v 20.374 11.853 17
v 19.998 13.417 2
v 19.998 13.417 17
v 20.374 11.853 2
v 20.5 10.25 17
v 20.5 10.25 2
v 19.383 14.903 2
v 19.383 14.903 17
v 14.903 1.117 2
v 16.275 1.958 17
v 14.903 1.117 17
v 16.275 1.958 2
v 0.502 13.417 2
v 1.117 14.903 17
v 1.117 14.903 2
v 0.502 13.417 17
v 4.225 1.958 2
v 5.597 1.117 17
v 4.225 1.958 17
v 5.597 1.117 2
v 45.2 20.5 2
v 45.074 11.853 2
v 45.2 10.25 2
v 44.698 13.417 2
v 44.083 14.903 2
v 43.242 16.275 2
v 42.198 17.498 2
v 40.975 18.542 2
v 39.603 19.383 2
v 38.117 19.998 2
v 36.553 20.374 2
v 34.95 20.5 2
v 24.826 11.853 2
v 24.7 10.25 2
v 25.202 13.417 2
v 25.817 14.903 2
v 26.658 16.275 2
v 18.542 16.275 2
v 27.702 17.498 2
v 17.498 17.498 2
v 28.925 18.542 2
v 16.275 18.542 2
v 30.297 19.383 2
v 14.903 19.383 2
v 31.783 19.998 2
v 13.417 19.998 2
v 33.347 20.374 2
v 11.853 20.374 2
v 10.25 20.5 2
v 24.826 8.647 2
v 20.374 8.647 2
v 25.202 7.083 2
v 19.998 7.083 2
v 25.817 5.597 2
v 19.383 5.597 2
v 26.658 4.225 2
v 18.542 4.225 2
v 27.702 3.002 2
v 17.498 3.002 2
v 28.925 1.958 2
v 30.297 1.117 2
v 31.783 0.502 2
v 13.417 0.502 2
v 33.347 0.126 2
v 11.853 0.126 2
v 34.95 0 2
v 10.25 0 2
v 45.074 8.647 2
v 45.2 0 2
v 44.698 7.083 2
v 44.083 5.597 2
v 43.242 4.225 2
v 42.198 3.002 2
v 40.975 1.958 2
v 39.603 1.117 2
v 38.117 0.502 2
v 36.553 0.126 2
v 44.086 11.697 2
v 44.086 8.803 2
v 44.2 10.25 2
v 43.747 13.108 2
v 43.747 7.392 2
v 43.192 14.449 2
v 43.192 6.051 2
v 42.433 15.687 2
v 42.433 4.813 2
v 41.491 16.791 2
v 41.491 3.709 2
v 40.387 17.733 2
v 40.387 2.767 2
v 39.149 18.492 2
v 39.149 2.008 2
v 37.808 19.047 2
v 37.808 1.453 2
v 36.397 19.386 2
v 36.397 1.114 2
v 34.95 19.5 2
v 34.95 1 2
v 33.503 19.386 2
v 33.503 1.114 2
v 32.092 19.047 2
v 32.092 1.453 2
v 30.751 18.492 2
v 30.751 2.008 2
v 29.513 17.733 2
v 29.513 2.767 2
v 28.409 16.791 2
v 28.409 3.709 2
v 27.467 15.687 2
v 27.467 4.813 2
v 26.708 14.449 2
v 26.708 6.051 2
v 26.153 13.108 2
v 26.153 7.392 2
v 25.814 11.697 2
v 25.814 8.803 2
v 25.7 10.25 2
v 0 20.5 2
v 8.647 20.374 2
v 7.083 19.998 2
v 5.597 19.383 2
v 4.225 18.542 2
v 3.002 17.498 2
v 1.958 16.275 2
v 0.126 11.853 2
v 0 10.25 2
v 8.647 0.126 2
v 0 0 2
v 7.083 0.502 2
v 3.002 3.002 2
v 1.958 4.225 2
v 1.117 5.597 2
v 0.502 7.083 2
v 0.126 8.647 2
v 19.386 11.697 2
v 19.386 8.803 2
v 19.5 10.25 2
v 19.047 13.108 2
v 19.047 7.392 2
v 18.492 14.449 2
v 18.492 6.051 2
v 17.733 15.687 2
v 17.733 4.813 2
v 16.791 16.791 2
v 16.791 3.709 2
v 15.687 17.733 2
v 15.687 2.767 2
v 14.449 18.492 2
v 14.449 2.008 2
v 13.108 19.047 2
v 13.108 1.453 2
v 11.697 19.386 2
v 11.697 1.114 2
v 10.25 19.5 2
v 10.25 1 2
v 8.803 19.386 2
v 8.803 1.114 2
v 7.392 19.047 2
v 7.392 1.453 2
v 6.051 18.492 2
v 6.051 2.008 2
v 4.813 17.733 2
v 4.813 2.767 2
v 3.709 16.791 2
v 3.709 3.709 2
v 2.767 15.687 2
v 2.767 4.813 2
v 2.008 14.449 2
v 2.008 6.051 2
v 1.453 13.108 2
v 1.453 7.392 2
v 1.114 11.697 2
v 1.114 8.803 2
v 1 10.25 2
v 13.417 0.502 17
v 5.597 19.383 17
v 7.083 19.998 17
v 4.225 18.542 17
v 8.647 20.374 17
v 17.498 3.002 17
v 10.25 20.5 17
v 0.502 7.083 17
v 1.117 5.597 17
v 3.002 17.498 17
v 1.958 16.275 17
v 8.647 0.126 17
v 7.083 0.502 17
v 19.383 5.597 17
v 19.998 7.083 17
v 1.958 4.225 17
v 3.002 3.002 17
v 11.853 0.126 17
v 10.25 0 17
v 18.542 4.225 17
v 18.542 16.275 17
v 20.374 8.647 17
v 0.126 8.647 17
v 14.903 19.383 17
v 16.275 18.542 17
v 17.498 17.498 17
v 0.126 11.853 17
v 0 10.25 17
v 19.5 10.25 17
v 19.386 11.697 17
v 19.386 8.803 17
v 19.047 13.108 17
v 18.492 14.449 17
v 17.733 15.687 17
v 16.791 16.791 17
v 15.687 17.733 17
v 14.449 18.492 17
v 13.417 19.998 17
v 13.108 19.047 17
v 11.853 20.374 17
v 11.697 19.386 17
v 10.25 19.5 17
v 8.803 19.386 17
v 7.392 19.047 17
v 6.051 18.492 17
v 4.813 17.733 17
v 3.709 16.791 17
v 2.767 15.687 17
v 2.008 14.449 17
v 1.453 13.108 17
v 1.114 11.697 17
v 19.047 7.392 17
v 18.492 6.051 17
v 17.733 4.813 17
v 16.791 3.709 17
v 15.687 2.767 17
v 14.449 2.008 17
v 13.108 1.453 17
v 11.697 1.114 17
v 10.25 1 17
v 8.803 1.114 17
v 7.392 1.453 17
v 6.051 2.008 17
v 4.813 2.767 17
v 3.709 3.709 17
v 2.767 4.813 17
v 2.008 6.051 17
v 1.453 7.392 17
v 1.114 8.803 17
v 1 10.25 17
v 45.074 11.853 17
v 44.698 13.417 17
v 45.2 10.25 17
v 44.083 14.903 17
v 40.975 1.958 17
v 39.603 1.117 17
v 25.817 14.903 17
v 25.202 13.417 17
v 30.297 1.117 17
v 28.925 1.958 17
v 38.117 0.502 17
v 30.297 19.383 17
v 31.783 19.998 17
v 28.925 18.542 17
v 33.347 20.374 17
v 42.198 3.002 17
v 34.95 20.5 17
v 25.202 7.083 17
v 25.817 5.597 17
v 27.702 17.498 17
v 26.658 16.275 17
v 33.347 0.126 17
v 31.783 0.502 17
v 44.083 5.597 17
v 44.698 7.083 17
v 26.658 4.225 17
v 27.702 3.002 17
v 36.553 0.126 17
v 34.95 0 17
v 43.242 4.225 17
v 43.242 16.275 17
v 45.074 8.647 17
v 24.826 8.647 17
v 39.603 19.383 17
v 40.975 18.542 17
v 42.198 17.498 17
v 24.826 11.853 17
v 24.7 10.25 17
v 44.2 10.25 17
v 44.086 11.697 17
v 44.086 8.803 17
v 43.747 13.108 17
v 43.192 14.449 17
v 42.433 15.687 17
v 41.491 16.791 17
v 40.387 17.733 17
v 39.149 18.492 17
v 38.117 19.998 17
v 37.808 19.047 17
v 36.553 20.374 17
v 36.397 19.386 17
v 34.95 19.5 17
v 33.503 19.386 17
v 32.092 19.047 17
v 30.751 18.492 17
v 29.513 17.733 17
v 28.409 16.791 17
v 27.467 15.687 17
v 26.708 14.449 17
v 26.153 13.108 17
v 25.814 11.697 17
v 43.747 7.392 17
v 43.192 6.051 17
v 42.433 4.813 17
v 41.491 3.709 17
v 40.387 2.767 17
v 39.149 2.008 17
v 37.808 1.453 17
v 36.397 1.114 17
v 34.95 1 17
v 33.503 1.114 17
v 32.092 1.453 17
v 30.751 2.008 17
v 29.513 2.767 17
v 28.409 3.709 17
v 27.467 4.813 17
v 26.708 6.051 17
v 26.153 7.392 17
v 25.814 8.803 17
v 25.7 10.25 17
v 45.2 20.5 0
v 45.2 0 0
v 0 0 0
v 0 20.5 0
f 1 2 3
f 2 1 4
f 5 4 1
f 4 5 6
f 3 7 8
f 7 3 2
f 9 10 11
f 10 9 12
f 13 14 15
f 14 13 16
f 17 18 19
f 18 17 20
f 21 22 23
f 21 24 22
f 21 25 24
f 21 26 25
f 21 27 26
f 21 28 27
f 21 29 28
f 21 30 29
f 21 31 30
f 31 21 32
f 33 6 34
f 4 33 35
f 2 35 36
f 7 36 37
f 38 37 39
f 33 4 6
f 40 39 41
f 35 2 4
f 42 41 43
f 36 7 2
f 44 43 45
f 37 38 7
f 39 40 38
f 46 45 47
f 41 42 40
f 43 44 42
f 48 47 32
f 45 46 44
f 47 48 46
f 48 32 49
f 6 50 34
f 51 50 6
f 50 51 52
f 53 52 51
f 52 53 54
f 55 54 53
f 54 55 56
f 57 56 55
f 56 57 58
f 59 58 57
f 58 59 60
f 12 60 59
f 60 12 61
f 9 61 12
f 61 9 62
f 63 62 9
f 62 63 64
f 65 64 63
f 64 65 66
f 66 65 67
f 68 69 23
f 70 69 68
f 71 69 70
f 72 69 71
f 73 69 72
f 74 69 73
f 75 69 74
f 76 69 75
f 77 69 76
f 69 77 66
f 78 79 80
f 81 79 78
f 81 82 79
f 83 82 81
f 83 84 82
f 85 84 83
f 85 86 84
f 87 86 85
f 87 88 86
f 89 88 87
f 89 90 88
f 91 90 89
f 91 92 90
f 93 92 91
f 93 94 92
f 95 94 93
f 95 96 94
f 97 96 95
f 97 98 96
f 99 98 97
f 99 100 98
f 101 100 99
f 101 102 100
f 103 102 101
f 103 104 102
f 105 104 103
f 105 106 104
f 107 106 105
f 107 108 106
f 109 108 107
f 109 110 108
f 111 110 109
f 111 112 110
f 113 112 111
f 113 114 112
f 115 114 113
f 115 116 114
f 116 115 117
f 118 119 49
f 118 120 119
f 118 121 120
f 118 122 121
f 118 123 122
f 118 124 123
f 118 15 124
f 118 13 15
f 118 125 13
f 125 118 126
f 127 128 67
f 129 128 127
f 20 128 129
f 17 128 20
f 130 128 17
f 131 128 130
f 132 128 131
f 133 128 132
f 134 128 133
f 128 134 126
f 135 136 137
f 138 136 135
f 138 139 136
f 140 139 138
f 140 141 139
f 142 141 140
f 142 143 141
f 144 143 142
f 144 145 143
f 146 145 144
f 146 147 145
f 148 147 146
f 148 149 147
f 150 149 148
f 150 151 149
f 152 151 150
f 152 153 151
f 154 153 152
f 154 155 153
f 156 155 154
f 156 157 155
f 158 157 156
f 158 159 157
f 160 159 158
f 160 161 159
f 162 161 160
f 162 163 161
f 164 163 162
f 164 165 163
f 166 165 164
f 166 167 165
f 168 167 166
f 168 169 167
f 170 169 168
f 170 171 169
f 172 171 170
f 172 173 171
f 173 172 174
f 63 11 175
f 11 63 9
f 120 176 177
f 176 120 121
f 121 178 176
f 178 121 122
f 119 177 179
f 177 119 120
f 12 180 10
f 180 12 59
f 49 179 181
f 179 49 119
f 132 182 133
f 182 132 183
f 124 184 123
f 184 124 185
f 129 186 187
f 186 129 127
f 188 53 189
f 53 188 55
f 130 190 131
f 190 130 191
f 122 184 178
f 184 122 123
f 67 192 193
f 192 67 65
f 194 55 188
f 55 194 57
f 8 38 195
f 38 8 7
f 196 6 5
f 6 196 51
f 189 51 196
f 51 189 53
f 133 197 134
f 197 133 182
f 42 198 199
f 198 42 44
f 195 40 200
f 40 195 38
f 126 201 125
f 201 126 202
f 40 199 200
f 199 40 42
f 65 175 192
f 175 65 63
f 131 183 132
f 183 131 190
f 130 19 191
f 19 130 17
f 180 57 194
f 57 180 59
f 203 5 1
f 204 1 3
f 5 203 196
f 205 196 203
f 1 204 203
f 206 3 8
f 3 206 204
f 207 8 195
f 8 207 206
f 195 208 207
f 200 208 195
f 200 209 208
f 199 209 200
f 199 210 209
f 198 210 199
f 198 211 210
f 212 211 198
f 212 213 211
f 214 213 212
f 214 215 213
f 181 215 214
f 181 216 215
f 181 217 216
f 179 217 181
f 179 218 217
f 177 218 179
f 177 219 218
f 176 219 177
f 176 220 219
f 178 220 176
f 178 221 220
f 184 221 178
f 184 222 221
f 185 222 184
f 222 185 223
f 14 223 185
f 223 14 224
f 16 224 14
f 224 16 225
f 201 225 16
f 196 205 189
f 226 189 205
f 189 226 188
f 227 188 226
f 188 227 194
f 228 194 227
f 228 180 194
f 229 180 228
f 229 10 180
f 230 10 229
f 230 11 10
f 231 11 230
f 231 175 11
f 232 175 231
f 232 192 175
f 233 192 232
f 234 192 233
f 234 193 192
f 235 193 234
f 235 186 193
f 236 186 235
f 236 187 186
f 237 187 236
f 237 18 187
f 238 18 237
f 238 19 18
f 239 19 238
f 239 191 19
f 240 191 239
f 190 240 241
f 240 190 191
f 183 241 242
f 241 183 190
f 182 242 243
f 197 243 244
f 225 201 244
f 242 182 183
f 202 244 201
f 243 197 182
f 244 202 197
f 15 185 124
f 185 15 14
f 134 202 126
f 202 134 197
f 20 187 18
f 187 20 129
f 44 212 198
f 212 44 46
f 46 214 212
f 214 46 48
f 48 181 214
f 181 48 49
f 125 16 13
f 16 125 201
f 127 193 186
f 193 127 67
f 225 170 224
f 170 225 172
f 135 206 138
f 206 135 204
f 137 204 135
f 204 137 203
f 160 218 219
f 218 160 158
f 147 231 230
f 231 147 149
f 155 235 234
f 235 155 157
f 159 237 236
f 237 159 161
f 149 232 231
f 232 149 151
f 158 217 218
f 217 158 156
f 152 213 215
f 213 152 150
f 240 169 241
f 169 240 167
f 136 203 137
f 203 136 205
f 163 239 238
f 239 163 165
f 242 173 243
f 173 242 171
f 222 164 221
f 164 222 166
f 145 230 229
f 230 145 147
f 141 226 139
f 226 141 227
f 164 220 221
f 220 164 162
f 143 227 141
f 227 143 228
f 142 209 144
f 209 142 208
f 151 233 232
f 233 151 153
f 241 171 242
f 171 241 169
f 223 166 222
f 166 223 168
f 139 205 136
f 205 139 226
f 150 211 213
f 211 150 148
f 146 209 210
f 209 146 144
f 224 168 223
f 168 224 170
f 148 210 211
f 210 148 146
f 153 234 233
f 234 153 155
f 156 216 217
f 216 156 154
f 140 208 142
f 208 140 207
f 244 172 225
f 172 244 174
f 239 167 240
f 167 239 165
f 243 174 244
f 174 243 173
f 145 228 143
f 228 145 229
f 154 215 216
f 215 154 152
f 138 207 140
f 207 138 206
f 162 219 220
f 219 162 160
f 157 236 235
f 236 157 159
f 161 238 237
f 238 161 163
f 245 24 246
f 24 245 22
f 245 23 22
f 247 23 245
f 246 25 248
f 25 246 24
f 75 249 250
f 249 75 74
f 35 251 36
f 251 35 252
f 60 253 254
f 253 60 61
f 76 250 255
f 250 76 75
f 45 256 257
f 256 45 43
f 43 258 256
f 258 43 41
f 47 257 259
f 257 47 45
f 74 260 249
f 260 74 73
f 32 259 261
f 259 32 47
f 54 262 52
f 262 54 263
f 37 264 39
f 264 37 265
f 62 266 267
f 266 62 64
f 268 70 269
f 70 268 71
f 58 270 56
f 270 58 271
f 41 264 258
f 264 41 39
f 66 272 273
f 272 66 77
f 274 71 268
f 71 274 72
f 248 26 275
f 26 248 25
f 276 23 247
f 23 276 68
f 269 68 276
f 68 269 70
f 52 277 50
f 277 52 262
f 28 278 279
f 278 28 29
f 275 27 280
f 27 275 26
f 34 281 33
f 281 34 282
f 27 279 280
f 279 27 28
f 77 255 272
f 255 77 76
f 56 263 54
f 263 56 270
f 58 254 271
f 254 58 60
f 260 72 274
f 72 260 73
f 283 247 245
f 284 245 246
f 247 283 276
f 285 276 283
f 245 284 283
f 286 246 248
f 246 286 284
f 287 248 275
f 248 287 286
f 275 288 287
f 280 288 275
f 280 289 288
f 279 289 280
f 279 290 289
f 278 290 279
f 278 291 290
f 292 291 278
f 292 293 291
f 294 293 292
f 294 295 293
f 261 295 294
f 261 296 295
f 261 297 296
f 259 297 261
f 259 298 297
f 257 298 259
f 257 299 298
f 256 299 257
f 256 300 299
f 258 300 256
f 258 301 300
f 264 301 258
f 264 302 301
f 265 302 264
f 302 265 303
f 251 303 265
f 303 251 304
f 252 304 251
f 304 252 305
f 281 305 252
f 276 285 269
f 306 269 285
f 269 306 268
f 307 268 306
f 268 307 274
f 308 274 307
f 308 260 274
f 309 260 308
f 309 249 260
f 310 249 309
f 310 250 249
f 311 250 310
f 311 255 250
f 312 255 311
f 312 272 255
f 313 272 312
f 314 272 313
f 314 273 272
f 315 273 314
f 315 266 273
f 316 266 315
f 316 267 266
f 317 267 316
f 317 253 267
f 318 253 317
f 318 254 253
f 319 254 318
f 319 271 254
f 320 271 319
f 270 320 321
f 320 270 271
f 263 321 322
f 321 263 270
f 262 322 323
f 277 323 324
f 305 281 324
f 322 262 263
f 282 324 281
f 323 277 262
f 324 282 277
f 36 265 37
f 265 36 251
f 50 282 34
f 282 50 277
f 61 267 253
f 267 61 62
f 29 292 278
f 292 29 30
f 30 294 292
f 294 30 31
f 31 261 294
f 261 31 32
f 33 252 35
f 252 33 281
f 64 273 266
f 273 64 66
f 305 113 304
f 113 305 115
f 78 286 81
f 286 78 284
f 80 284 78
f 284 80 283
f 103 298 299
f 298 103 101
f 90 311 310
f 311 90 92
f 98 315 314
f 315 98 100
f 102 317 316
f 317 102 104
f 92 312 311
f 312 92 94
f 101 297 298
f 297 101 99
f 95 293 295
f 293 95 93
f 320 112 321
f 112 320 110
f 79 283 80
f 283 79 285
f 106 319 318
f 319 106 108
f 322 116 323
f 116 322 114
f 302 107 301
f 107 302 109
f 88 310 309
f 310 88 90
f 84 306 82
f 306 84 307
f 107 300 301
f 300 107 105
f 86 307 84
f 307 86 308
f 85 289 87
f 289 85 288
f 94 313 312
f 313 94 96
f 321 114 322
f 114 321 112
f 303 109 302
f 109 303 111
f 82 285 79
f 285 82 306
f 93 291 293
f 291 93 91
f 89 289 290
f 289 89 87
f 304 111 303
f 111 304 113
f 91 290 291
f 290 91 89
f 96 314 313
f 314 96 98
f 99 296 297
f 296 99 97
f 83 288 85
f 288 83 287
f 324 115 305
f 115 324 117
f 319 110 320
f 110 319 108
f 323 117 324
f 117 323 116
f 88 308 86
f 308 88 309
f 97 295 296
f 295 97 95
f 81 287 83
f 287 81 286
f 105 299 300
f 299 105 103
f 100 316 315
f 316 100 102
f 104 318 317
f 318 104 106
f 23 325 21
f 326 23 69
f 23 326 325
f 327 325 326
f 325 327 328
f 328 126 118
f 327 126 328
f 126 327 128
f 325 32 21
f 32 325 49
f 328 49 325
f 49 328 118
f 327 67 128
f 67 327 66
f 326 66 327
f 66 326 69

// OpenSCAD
// file: config.scad
// Author: Mihai Oltean, www.tcreate.org, mihai.oltean@gmail.com
// More details: jenny5.org
// Source: github.com/jenny5-robot
// MIT License
//--------------------------------------------------------------

aluminium_color = "Silver";
screw_color = "LightSlateGray";
frame_color = aluminium_color;
shaft_color = "Silver";
plastic_color = "LimeGreen";
pulley_color = "DarkSlateGray";
steel_color = "LightSlateGray";
// file: utils.scad
// Author: Mihai Oltean, https://mihaioltean.github.io, mihai.oltean@gmail.com
// More details: https://jenny5.org, https://jenny5-robot.github.io/
// Source code: github.com/jenny5-robot
// License: MIT
//--------------------------------------------------------------
module corner(radius, height)
{
	difference(){
		cube ([radius, radius, height]);
		cylinder	(h = height, r = radius, $fn = 30);
	}
}
//---------------------------------------------------------------
module spherical_corner(radius)
{
	difference(){
		cube ([radius, radius, radius]);
		sphere(r = radius, $fn = 40);
	}
}
//---------------------------------------------------------------
module spherical_column(height, radius)
{
		difference(){
			cube ([height, height, height]);
			cylinder(h= height, r = radius, $fn = 50);
		}
}
//---------------------------------------------------------------

spherical_column(height = 100, radius = 10);
// file: params_basic_components.scad
// Author: Mihai Oltean, www.tcreate.org, mihai.oltean@gmail.com
// More details: jenny5.org
// Source: github.com/jenny5-robot
// MIT License
//--------------------------------------------------------------

spring_length = 20;

smooth_rod_8_radius = 4;
smooth_rod_10_radius = 5;
smooth_rod_12_radius = 6;

tolerance = 0.1;
display_tolerance = 1;

overlap_tolerance = 0.01;


wall_thick_1 = 1;
wall_thick_2 = 2;
wall_thick_3 = 3;
wall_thick_4 = 4;
wall_thick_5 = 5;
wall_thick_5_5 = 5.5;
wall_thick_6 = 6;
wall_thick_7 = 7;
wall_thick_8 = 8;
wall_thick_9 = 9;
wall_thick_10 = 10;
wall_thick_12 = 10;

wrench_radius = 11;

ghidaj_radius = 4;
ghidaj_radius_12 = 6;

canal_diameter = 8.22;
canal_height = 2.2;

filament_radius = 0.9;

bowden_tube_radius = 2.5;

m3_tolerance = 0.1;

latura_mare_L = 40;
latura_mica_L = 15;
grosime_perete_L = 3;

latura_L_50x50 = 50;
latura_L_40x40 = 40;

latura_U_50x50 = 50;
latura_U_40x40 = 40;


tolerance_z = [0, 0, tolerance];
tolerance_x = [tolerance, 0, 0];
tolerance_y = [0, tolerance, 0];

display_tolerance_z = [0, 0, display_tolerance];
display_tolerance_x = [display_tolerance, 0, 0];
display_tolerance_y = [0, display_tolerance, 0];

display_tolerance_xz = [display_tolerance, 0, display_tolerance];
display_tolerance_xy = [display_tolerance, display_tolerance, 0];
display_tolerance_yz = [0, display_tolerance, display_tolerance];

display_tolerance_xyz = [display_tolerance, display_tolerance, display_tolerance];
// file: params_screws_nuts_washers.scad
// Author: Mihai Oltean, www.tcreate.org, mihai.oltean@gmail.com
// More details: jenny5.org
// Source: github.com/jenny5-robot
// MIT License
//--------------------------------------------------------------


m2_screw_radius = 1;
m2_nut_radius = 2.2;
m2_nut_height = 1.6;
m2_nut_thick = m2_nut_height;

m3_screw_radius = 1.5;
m3_nut_radius = 3.1;
m3_nut_height = 2.3;
m3_nut_thick = m3_nut_height;
m3_autolock_nut_thick = 4.2;

m4_screw_radius = 2;
m4_nut_radius = 4;
m4_auto_lock_nut_height = 5;
m4_nut_height = 3.25;
m4_nut_thick = 3.25;

m5_screw_radius = 2.5;
m5_nut_radius = 4.6;
m5_nut_height = 4;

m6_screw_radius = 3;
m6_nut_radius = 5.65;
m6_nut_thick = 5;
m6_nut_slim_thick = 3;
m6_autolock_nut_thick = 6;
m6_long_nut_thick = 9;

m8_screw_head_height = 5.7;
m8_screw_radius = 3.9;
m8_nut_small_width = 12.8;
m8_nut_radius = 7.3;
m8_slim_nut_small_width = 12.4;
m8_nut_thick = 6.5;
m8_nut_height = m8_nut_thick;
m8_slim_nut_height = 5.5;
m8_screw_head_radius = 6.5;
m8_autolock_nut_thick = 8;

m10_screw_radius = 5;
m10_nut_thick = 8;
m10_nut_radius = 9.8;

M12_screw_radius = 6;
M12_nut_thick = 8;
M12_nut_radius = 11;
M12_long_long_nut_thick = 36;
M12_long_nut_thick = 36;
M12_autolock_nut_thick = 14;

m10_long_nut_radius = 9.71;
m10_long_nut_height = 29.8;

m10_long_thick_nut_radius = 7.41;
m10_long_thick_nut_height = 30.4;

m12_plastic_nut_radius = 10.45;
m12_plastic_nut_height = 23.3;

tr12_3_nut_radius = 11;
tr12_3_nut_height = 18.1;

washer_5 = 0.97;

washer_4_12_radius = 6;
washer_4_12_external_radius = 6;
washer_4_12_thick = 1;
washer_4_thick = 1;
washer_4_12_internal_radius = 2.15;

washer_4_9_external_radius = 4.5;
washer_4_9_internal_radius = 2.15;
washer_4_9_thick = 1;

washer_6_thick = 1.7;
washer_8_thick = 1.5;
washer_5_thick = 1;

washer_10_height = 2;
washer_10_thick = 2;

washer_12_thick = 2;

washer_5_15_external_radius = 7.5;
washer_5_15_thick = 1;
washer_5_thick = 1;
washer_5_15_internal_radius = 2.65;
// file: params_ultrasonic.scad
// Author: Mihai Oltean, www.tcreate.org, mihai.oltean@gmail.com
// More details: jenny5.org
// Source: github.com/jenny5-robot
// MIT License
//--------------------------------------------------------------

hc_sr04_sizes = [45.2, 20.5, 2];
hc_sr04_arm_sizes = [44, 21, 9];

hc_sr04_dist_to_holes = 0.75;

hc_sr04_hole_position = [
[hc_sr04_dist_to_holes, hc_sr04_dist_to_holes, 0], 
[hc_sr04_dist_to_holes + 42.5, hc_sr04_dist_to_holes, 0],
[hc_sr04_dist_to_holes + 42.5, hc_sr04_dist_to_holes + 17.5, 0],
[hc_sr04_dist_to_holes, hc_sr04_dist_to_holes + 17.5, 0]
];
// main file
include <params_ultrasonic.scad>
include <params_screws_nuts_washers.scad>
use <basic_components.scad>



//--------------------------------------------------------------
module hc_sr04()
{
  color("blue") cube([hc_sr04_sizes[0], hc_sr04_sizes[1], 2]);
  color("silver") translate ([hc_sr04_sizes[1] / 2, hc_sr04_sizes[1] / 2, 2]) cylinder_empty (15, hc_sr04_sizes[1] / 2, hc_sr04_sizes[1] / 2 - 1,40);  
    color("silver") translate ([hc_sr04_sizes[0] - hc_sr04_sizes[1] / 2, hc_sr04_sizes[1] / 2, 2]) cylinder_empty (15, hc_sr04_sizes[1] / 2, hc_sr04_sizes[1] / 2 - 1, 40);  
}
//--------------------------------------------------------------

hc_sr04();
